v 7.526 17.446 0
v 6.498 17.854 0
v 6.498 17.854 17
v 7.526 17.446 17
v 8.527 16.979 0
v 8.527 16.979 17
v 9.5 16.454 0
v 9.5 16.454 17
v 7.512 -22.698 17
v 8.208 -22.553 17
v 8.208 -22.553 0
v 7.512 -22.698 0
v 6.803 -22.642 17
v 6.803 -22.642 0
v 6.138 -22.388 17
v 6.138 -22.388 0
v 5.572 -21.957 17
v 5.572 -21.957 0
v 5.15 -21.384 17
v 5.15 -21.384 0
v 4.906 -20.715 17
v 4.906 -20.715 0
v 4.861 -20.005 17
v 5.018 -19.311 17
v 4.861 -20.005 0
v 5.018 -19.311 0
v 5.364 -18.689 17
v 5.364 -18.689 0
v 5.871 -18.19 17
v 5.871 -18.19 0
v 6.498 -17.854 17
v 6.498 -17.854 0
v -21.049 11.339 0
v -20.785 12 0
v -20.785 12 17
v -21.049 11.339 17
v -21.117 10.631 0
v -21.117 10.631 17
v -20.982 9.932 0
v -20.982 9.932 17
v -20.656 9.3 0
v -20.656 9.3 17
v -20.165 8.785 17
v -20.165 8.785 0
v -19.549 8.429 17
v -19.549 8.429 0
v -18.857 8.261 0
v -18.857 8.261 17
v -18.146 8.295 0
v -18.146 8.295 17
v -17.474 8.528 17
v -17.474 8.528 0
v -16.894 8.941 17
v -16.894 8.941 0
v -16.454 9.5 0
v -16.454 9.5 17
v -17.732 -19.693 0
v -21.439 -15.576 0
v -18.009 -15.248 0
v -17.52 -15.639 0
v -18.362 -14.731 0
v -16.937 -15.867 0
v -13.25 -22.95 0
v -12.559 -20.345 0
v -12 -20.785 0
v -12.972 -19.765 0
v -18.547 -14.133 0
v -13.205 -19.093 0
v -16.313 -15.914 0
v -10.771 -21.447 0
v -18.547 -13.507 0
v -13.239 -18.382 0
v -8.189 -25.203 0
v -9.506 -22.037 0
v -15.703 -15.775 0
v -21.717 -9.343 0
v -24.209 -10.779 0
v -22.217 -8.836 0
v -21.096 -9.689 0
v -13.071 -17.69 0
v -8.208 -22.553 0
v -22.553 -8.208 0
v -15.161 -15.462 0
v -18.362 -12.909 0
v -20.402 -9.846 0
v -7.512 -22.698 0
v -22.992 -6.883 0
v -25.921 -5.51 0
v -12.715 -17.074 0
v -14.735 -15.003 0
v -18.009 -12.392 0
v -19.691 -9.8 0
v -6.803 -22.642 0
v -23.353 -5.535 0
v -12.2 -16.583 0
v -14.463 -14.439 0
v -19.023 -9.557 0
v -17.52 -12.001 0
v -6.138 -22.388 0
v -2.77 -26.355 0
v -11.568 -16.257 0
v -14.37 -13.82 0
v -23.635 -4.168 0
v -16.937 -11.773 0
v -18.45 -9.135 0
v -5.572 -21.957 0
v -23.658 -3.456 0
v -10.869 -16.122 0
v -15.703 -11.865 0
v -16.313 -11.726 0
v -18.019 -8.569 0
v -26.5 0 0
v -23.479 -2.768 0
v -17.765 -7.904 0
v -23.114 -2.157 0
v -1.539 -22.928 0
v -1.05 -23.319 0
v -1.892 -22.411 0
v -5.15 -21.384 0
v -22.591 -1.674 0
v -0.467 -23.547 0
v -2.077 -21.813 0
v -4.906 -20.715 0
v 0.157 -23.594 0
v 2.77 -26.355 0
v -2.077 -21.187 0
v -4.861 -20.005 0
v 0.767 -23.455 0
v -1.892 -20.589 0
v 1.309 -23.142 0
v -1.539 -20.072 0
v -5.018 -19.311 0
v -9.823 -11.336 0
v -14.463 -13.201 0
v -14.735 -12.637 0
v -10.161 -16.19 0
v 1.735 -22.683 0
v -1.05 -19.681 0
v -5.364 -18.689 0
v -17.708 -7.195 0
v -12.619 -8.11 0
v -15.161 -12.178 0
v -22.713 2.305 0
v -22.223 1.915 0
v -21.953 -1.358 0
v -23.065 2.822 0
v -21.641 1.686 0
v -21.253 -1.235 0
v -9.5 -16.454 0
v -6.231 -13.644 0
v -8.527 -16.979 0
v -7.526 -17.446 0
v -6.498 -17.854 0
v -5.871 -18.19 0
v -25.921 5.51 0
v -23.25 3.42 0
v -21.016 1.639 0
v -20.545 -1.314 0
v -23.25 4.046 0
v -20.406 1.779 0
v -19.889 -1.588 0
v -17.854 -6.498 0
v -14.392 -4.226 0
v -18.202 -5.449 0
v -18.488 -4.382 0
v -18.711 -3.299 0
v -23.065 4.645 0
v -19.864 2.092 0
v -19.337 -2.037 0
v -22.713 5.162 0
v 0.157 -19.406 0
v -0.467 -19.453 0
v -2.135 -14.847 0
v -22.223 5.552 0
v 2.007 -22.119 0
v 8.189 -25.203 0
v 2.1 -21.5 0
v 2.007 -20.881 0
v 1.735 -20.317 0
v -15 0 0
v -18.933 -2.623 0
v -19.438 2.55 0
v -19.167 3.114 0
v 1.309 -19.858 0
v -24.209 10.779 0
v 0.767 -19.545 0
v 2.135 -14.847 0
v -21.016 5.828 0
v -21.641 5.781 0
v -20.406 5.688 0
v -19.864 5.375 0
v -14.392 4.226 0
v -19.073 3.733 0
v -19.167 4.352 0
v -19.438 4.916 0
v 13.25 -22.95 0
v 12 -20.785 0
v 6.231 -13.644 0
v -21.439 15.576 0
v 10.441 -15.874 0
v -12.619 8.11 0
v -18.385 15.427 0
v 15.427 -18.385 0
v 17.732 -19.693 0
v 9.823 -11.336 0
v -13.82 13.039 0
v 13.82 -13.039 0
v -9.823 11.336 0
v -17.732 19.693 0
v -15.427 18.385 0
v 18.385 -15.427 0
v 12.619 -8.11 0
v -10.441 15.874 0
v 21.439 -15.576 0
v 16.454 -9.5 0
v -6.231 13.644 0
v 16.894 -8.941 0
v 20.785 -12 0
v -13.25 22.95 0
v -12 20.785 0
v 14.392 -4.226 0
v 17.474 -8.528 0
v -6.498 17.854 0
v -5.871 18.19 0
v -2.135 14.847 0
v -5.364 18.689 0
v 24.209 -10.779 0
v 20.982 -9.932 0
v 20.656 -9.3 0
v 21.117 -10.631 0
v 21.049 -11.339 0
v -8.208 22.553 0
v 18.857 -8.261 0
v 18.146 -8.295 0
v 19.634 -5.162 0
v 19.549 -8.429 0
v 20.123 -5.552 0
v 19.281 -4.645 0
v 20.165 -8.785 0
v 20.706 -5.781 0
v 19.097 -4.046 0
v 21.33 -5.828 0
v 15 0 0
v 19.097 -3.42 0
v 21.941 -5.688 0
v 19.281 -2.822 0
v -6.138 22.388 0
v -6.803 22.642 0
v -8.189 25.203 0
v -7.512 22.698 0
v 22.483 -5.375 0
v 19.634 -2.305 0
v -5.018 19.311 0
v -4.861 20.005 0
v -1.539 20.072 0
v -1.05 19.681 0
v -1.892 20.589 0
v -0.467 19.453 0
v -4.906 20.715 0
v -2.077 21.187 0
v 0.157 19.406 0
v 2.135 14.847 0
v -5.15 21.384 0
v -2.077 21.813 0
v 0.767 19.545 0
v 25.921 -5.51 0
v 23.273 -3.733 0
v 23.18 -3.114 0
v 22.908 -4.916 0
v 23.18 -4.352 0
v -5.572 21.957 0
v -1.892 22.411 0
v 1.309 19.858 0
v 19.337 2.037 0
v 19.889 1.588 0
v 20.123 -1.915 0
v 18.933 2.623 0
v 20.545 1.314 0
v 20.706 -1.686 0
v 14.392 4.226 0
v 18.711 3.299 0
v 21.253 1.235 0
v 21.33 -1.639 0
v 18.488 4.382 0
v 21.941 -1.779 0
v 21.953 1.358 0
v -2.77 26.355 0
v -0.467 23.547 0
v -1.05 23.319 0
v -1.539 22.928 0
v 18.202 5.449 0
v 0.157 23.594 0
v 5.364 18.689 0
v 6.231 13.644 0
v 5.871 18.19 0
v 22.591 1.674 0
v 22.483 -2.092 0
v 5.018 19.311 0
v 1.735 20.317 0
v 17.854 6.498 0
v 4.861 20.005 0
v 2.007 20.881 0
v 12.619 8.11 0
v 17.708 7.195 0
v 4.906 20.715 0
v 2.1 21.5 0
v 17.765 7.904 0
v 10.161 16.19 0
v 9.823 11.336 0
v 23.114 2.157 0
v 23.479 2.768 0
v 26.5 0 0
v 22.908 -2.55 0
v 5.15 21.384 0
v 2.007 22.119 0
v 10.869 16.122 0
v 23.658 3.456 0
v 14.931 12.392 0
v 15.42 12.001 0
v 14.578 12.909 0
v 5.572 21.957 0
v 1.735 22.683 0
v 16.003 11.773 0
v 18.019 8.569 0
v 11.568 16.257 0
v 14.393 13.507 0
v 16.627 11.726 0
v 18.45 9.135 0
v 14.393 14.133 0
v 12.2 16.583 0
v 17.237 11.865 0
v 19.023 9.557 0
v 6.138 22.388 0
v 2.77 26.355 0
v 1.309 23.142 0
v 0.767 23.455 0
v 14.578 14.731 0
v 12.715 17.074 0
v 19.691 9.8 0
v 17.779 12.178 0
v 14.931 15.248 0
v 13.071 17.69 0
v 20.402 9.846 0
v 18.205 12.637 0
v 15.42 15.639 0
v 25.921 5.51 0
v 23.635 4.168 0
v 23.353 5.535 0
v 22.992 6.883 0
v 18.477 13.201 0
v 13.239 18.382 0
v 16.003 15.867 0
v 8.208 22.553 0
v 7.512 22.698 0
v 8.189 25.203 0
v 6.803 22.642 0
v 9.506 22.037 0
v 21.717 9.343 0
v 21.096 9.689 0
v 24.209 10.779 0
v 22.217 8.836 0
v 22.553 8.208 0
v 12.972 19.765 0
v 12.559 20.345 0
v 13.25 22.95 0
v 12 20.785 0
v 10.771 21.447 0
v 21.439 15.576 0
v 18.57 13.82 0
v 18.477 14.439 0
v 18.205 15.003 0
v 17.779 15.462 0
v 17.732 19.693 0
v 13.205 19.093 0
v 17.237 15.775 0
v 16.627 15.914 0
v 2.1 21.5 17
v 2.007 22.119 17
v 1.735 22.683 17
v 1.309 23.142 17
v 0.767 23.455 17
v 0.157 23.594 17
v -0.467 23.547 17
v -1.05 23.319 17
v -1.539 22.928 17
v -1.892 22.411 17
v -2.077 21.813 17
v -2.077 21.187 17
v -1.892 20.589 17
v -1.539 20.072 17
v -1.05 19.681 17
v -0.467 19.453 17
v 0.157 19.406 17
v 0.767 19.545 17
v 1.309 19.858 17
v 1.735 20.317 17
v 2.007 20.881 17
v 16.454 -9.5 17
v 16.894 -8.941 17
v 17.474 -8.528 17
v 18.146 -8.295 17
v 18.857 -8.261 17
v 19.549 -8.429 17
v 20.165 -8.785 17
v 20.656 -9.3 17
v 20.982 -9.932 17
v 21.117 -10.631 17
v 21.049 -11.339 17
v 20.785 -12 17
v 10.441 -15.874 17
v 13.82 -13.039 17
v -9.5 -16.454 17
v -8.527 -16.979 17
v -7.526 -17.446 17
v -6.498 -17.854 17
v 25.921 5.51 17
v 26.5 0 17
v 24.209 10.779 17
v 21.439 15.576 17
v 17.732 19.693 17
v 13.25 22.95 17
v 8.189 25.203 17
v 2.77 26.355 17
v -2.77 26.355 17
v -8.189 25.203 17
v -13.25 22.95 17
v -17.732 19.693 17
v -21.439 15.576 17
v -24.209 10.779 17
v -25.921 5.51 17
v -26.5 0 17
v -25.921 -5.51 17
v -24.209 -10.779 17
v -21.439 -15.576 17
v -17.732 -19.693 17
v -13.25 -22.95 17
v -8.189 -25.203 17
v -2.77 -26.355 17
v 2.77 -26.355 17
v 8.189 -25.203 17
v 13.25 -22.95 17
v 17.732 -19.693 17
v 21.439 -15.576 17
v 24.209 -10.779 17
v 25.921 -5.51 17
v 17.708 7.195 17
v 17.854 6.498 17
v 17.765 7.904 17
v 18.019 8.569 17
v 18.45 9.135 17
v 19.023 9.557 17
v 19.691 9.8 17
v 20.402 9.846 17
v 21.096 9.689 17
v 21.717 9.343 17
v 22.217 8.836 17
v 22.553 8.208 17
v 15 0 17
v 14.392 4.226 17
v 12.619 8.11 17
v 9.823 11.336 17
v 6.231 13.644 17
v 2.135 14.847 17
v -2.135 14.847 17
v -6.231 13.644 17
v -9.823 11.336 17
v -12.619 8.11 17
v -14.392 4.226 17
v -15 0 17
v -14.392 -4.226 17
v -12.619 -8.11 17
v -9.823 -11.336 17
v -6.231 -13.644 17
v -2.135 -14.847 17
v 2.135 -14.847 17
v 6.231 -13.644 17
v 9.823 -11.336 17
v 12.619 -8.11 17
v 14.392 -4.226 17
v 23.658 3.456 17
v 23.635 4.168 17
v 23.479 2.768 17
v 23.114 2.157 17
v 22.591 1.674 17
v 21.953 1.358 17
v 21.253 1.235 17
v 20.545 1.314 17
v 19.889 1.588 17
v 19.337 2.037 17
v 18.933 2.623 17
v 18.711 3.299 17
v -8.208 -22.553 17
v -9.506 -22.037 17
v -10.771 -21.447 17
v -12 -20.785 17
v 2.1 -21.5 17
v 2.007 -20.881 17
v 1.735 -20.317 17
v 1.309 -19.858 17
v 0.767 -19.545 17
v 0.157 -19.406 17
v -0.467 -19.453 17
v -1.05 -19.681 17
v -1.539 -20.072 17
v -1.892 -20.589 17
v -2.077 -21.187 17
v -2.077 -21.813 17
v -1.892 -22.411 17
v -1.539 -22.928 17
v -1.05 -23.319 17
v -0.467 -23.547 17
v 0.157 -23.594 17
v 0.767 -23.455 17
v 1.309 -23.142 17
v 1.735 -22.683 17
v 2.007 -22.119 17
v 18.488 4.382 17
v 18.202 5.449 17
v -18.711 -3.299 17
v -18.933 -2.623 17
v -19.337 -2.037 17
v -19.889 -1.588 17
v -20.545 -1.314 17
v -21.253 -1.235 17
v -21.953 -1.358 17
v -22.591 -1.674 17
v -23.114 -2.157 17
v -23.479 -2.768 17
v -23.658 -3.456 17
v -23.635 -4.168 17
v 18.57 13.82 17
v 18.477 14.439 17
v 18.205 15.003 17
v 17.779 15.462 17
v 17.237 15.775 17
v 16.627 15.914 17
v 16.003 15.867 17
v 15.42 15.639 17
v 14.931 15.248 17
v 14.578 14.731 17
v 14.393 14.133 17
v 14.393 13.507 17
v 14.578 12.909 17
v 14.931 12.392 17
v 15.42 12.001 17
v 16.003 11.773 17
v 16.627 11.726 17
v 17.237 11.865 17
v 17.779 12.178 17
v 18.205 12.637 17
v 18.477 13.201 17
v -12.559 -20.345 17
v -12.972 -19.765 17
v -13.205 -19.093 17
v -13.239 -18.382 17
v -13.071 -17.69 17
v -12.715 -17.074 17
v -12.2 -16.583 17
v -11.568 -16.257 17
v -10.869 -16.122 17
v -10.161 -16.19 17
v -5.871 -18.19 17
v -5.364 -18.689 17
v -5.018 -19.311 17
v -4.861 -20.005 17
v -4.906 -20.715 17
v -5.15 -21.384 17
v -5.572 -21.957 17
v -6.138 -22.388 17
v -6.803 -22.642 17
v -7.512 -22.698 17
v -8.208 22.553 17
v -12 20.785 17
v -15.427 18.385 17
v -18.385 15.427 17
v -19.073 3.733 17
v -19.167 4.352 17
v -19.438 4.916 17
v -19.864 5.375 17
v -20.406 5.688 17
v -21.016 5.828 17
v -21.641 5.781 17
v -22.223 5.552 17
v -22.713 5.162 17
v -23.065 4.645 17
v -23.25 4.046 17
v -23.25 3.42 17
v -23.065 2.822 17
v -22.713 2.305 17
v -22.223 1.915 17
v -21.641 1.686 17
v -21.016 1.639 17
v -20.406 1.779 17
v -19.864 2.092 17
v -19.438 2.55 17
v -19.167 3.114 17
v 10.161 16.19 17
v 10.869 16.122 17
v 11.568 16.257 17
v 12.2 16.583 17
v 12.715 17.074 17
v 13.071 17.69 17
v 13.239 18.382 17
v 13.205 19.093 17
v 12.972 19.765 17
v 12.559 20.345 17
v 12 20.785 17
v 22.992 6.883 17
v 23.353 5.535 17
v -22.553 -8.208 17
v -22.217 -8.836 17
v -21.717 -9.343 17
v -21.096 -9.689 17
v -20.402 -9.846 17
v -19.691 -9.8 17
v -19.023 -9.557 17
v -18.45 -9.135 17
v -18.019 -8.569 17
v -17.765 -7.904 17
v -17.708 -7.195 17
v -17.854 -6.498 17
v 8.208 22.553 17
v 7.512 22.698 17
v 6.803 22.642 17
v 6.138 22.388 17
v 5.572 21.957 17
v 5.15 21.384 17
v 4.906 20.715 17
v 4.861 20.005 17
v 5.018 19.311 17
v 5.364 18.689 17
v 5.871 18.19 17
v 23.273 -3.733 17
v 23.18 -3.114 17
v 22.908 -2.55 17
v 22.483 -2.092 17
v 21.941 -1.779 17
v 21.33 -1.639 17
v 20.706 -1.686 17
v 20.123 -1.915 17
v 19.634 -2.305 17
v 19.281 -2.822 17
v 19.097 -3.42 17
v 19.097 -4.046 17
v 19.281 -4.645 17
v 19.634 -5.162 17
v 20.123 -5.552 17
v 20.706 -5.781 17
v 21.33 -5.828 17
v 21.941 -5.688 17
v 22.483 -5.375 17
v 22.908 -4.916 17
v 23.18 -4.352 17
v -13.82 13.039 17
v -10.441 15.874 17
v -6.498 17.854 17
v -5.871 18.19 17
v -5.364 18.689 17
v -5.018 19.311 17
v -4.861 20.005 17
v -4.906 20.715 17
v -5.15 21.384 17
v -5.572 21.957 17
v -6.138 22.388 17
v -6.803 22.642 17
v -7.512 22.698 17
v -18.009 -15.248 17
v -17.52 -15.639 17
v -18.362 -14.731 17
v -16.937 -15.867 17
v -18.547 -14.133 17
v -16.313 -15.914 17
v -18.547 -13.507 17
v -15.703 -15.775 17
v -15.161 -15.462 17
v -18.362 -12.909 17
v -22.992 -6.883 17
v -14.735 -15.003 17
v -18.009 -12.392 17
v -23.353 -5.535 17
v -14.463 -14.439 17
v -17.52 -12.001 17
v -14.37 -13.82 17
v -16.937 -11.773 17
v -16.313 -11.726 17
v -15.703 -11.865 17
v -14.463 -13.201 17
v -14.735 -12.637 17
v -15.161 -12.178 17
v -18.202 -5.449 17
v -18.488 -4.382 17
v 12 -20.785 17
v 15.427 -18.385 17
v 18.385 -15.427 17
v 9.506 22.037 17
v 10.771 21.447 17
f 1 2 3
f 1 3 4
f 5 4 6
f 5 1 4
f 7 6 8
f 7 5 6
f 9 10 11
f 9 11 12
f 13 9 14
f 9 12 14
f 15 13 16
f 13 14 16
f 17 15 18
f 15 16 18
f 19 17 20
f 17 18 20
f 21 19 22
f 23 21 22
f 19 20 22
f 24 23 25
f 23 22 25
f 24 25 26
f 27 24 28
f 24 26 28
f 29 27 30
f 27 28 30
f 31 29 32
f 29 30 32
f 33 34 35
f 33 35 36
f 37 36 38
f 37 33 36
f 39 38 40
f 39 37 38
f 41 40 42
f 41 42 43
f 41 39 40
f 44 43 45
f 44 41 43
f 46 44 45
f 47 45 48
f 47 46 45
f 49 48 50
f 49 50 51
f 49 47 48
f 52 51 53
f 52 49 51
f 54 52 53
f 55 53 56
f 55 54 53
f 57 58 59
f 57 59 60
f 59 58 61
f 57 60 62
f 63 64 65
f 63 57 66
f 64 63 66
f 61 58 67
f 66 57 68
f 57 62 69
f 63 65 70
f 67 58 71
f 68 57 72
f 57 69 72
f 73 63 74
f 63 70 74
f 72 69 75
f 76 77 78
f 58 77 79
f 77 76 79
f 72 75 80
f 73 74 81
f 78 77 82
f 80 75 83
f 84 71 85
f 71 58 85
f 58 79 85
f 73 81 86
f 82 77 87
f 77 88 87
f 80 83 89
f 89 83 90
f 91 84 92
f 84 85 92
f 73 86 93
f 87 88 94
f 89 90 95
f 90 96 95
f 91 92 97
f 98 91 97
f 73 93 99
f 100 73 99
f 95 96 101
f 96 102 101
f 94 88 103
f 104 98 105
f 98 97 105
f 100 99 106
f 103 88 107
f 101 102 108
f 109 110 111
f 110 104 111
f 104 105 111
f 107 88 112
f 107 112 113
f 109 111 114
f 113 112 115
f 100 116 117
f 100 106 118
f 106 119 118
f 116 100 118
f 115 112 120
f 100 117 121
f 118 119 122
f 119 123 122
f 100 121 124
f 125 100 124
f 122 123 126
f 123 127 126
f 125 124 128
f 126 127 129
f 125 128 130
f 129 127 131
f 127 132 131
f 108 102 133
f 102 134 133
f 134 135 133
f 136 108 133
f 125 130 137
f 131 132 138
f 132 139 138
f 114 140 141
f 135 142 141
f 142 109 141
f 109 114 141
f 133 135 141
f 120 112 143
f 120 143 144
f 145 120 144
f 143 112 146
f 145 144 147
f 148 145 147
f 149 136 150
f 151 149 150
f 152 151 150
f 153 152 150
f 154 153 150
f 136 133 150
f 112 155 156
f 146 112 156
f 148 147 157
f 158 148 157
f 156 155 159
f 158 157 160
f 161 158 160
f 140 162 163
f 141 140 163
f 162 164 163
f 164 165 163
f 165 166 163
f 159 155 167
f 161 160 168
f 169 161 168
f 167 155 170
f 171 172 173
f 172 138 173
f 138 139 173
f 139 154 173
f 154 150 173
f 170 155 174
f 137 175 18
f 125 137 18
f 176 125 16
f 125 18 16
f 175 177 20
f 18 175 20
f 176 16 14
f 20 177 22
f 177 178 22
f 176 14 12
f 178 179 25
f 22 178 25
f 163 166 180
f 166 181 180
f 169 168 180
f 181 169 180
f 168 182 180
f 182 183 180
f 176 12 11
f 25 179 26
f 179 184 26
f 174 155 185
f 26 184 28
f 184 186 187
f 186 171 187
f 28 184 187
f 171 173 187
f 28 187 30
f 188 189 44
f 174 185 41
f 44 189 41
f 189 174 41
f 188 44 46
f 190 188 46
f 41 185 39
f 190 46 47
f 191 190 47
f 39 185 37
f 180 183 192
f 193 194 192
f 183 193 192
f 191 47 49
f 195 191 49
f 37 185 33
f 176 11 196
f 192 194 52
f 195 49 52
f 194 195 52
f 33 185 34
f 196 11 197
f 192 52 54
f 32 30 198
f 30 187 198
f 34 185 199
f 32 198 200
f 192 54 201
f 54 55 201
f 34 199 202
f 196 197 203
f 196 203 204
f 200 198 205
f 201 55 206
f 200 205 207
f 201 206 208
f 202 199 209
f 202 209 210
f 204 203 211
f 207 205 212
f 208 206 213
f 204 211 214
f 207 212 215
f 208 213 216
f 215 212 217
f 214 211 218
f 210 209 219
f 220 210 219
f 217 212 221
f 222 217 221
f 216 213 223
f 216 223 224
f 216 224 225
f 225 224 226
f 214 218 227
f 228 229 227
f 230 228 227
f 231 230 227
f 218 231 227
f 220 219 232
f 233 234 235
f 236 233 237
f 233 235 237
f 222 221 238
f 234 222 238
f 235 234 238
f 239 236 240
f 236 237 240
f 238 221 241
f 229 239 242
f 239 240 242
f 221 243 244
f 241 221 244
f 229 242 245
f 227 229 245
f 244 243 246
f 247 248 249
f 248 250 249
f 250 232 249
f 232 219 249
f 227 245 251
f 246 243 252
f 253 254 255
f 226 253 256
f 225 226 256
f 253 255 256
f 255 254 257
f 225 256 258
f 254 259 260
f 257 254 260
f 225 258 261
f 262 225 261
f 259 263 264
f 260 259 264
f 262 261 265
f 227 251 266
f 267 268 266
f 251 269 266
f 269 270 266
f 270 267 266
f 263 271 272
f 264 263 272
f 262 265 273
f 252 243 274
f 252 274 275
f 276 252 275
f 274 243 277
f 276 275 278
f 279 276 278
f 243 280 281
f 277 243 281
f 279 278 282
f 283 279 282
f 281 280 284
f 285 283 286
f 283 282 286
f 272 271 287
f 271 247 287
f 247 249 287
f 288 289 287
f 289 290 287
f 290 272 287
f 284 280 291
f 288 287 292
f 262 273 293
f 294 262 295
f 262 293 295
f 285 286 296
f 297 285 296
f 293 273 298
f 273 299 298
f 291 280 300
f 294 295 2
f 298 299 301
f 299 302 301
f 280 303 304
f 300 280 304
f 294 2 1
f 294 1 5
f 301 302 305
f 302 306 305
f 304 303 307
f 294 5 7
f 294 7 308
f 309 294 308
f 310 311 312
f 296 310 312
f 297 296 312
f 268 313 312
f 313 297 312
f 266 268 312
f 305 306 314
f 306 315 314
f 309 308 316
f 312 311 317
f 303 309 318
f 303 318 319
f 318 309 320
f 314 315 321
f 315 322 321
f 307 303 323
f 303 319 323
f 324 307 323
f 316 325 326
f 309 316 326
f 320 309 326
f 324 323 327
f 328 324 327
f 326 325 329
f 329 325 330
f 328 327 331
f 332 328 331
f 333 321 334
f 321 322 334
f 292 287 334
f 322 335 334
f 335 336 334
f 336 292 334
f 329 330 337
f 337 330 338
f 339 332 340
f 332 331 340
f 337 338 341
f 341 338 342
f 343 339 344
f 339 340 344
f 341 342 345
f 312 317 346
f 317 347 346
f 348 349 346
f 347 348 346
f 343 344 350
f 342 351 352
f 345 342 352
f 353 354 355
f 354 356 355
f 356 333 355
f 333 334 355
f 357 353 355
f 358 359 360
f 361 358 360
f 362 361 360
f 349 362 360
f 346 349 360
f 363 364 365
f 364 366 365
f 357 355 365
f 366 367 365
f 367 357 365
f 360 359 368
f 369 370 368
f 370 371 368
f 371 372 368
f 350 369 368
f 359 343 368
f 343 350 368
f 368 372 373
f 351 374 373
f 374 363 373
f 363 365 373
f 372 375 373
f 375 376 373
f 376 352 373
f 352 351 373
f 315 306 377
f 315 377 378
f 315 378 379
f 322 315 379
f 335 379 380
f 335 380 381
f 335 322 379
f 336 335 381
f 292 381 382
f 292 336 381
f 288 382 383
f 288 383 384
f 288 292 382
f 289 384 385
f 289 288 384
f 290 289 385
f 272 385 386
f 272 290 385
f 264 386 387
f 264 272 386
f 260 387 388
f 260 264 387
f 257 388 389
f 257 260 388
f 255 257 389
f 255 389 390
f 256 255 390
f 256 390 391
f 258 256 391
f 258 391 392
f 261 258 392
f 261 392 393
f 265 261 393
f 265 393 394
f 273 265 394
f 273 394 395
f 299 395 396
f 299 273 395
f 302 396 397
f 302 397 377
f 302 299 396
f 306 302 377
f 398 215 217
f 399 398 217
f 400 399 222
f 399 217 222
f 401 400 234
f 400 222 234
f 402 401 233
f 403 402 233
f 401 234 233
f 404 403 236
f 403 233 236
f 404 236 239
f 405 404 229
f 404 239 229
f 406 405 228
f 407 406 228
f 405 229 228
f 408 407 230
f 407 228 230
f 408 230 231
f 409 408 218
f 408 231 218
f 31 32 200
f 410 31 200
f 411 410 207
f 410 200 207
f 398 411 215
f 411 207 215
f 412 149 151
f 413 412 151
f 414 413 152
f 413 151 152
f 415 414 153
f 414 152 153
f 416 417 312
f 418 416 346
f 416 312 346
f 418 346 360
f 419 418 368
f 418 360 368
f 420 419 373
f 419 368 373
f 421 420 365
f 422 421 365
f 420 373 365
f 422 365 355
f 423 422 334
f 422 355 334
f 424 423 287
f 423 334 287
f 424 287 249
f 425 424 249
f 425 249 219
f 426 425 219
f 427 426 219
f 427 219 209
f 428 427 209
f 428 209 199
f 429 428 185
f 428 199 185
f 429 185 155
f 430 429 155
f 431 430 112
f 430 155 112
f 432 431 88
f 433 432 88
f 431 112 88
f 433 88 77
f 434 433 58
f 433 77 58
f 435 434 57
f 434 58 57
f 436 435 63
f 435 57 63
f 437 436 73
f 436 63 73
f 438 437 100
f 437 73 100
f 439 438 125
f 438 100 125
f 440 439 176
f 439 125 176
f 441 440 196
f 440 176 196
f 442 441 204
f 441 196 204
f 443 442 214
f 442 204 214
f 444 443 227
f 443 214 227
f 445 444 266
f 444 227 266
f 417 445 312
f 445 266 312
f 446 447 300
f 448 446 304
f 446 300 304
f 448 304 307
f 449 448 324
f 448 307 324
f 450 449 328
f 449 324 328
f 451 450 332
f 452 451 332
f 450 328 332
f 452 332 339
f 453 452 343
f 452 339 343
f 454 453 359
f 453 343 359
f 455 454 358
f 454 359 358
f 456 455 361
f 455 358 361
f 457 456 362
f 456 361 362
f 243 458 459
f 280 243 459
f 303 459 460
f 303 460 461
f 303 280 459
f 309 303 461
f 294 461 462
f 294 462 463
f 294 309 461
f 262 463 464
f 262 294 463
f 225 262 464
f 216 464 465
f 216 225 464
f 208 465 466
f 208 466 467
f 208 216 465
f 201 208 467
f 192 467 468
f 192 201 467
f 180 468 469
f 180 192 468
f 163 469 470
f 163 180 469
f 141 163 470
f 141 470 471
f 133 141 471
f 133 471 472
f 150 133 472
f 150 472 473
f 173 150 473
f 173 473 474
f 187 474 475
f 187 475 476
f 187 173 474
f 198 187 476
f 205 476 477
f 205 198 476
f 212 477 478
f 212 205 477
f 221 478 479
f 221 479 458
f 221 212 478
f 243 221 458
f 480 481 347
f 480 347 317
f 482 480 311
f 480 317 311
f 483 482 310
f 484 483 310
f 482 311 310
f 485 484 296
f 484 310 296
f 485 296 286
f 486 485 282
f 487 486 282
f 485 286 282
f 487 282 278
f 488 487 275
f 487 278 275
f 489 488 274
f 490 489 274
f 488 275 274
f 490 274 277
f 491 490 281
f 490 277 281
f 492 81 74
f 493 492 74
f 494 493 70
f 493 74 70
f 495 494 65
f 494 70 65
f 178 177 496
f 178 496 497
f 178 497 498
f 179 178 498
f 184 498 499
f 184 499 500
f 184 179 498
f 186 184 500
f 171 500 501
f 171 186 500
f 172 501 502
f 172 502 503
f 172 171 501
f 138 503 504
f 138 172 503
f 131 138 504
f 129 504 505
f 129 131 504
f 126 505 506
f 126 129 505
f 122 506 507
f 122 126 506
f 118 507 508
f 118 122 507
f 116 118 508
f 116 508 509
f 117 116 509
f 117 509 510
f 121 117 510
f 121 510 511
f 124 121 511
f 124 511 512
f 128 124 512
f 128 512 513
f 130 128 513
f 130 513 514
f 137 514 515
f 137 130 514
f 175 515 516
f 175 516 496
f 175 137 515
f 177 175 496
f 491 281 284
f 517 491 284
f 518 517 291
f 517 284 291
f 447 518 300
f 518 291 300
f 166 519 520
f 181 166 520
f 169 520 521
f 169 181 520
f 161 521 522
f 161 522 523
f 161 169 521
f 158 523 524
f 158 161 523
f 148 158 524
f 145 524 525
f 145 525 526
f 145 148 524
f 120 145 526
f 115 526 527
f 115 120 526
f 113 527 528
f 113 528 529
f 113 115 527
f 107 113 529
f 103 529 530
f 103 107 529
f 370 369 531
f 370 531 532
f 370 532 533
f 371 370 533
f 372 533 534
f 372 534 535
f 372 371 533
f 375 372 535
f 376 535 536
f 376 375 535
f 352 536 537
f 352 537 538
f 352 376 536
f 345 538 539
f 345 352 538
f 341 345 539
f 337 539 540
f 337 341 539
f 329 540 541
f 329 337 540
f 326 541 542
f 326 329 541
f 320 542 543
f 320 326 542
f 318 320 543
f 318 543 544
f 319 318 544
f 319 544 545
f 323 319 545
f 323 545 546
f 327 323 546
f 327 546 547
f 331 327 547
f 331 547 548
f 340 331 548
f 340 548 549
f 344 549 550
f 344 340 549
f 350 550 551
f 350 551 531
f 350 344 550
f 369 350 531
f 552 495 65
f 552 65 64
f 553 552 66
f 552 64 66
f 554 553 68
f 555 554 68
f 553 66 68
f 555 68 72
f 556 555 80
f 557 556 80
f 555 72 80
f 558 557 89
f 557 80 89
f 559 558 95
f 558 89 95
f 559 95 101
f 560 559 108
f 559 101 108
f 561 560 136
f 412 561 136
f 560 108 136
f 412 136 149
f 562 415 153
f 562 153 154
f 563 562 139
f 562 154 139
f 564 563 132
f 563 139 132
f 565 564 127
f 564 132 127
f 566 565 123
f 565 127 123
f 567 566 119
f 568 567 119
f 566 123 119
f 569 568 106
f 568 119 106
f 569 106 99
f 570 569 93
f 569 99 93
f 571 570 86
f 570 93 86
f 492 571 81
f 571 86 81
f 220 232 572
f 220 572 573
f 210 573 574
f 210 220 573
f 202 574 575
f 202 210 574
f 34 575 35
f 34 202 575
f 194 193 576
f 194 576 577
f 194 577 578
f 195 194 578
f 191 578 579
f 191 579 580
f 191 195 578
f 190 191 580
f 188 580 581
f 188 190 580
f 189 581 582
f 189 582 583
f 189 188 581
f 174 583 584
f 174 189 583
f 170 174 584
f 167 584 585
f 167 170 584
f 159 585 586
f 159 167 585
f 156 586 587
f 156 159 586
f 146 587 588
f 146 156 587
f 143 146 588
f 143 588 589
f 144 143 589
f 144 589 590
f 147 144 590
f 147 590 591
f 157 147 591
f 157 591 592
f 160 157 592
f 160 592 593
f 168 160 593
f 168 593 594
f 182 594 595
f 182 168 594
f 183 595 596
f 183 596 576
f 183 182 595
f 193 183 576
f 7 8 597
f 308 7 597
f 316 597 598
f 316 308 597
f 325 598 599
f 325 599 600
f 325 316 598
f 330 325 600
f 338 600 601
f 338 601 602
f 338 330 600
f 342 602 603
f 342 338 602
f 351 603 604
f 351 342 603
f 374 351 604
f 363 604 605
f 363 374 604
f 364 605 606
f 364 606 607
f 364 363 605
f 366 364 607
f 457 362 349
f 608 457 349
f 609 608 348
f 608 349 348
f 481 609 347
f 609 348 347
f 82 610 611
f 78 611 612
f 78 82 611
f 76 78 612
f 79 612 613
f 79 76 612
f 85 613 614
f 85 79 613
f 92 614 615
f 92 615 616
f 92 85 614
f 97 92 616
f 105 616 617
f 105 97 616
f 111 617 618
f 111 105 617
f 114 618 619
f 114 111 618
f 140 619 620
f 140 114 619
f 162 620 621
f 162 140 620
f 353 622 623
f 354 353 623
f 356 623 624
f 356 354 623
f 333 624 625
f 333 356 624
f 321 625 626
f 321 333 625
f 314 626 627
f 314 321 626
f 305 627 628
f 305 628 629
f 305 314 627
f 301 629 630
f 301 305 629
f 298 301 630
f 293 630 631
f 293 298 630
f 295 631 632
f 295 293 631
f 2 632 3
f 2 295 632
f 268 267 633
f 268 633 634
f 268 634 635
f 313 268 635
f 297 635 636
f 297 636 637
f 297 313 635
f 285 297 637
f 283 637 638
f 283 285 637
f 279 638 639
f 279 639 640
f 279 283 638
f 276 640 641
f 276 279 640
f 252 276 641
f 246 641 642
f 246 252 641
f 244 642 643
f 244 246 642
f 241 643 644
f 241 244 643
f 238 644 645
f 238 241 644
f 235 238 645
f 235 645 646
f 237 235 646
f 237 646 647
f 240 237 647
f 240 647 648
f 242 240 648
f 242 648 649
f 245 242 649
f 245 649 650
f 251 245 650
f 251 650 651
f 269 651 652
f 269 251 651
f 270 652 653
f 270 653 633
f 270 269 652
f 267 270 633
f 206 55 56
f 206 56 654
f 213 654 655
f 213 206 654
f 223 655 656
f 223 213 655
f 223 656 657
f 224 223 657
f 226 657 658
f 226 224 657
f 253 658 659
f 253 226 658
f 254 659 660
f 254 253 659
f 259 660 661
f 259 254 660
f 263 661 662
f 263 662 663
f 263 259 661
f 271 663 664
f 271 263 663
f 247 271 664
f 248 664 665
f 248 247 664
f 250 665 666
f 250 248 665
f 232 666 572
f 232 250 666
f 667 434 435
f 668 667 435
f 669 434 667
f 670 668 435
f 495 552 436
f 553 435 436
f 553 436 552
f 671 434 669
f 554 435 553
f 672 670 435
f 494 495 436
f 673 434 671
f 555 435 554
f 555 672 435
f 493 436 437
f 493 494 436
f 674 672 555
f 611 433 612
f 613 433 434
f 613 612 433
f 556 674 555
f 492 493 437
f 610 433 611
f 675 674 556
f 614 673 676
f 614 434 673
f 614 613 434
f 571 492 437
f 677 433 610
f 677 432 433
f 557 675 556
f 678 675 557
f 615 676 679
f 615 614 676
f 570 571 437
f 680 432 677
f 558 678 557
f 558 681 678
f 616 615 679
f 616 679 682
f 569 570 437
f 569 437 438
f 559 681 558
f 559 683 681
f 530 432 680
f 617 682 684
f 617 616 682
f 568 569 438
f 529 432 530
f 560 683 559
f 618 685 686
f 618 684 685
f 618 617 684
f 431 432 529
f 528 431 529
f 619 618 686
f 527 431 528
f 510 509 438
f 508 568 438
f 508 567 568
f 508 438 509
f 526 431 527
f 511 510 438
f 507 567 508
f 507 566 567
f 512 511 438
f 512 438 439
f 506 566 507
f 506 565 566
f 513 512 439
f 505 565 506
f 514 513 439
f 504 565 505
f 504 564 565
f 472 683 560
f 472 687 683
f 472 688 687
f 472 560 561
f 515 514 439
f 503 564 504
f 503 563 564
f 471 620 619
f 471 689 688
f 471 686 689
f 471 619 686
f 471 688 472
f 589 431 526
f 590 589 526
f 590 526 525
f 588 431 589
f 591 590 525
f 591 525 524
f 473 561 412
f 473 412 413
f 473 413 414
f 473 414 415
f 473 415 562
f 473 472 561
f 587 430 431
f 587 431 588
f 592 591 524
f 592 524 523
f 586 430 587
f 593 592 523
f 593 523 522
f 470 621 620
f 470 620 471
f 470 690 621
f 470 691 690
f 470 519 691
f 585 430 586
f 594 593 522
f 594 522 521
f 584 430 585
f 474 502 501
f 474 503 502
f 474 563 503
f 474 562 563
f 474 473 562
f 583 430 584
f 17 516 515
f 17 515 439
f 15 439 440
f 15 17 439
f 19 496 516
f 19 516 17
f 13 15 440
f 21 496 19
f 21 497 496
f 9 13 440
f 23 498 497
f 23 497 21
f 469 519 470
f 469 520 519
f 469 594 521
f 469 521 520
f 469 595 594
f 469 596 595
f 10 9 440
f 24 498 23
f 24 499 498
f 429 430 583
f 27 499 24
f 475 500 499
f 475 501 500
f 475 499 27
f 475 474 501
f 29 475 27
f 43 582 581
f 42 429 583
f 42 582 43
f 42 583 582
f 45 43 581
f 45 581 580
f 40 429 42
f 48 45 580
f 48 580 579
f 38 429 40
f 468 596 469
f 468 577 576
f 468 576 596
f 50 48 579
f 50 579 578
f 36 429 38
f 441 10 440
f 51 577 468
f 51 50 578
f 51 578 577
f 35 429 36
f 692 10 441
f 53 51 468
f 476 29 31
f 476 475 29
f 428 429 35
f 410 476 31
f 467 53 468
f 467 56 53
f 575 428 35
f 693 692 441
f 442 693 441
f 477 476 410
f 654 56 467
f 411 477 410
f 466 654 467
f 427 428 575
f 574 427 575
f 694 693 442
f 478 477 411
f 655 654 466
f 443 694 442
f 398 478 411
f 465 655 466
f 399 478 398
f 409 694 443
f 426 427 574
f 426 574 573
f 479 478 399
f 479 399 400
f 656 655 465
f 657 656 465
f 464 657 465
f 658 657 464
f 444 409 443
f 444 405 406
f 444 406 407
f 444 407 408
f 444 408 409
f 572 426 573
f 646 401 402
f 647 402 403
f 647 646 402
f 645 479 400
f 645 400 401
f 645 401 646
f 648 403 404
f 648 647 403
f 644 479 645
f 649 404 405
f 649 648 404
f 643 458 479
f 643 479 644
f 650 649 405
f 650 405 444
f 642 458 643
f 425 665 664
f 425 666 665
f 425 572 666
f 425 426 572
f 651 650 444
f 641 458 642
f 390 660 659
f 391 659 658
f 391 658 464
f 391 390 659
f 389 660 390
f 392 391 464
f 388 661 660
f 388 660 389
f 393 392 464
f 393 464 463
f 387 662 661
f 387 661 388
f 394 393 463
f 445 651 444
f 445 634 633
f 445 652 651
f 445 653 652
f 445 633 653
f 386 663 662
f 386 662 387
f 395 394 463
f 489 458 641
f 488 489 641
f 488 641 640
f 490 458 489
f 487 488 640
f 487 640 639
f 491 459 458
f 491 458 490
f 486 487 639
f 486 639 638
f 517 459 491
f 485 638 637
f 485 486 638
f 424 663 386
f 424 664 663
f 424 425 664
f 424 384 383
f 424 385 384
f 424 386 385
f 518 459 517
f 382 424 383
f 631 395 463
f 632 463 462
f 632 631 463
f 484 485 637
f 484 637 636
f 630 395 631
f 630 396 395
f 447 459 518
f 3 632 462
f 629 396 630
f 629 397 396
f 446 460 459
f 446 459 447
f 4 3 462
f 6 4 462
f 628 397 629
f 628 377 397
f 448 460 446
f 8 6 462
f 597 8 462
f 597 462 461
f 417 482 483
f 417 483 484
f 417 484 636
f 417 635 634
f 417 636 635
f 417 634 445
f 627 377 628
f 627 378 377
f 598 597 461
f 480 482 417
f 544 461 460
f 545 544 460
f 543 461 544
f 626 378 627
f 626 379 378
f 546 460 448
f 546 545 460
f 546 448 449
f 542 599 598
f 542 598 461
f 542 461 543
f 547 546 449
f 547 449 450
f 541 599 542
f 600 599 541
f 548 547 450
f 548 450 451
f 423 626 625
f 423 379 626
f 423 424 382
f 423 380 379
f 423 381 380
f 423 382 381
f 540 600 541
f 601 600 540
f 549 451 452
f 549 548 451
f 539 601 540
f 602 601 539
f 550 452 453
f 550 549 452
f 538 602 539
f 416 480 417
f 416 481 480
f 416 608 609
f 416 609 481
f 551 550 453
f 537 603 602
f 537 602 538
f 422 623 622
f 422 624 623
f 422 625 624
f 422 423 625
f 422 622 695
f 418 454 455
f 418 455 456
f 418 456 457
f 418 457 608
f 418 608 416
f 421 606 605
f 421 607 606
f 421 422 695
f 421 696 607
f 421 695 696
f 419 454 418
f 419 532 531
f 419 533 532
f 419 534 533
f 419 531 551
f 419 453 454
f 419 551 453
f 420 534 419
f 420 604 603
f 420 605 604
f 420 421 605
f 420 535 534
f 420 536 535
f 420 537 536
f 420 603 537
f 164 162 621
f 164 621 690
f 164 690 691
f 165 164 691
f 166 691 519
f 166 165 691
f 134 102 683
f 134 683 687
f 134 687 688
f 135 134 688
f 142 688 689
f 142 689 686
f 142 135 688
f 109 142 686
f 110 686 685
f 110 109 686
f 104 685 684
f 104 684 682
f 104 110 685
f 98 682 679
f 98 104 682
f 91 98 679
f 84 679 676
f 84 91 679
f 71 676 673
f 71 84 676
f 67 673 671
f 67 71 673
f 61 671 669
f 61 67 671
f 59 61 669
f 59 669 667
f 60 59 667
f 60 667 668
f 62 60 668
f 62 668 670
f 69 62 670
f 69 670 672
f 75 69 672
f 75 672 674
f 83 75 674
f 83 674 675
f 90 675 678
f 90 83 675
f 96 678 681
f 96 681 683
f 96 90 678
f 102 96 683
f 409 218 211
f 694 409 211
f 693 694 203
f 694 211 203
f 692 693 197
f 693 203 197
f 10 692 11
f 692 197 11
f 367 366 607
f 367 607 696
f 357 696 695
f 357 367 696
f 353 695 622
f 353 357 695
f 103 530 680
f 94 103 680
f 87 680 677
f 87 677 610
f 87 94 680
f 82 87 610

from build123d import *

# Parameters (mm, degrees)
SKETCH_1_R      = 26.5
SKETCH_1_R_2    = 15
SKETCH_1_R_3    = 2.1
EXTRUDE_1_DEPTH = 17


with BuildPart() as part:
    # 草图1 → 凸台-拉伸1 (new body)
    with BuildSketch(Plane.XY):
        Circle(SKETCH_1_R)
        Circle(SKETCH_1_R_2, mode=Mode.SUBTRACT)
        with Locations((0, 21.5)):
            Circle(SKETCH_1_R_3, mode=Mode.SUBTRACT)
        with Locations((16.469955527, 13.819933608)):
            Circle(SKETCH_1_R_3, mode=Mode.SUBTRACT)
        with Locations((21.17336669, -3.73343582)):
            Circle(SKETCH_1_R_3, mode=Mode.SUBTRACT)
        with Locations((0, -21.5)):
            Circle(SKETCH_1_R_3, mode=Mode.SUBTRACT)
        with Locations((-16.469955527, -13.819933608)):
            Circle(SKETCH_1_R_3, mode=Mode.SUBTRACT)
        with Locations((-21.17336669, 3.73343582)):
            Circle(SKETCH_1_R_3, mode=Mode.SUBTRACT)
        with BuildLine():
            ThreePointArc((-8.20848344, 22.552622899), (-15.426902632, 18.385066635), (-20.784609691, 12))
            ThreePointArc((-20.784609691, 12), (-19.869546181, 8.584936491), (-16.454482672, 9.5))
            ThreePointArc((-16.454482672, 9.5), (-12.212964584, 14.554844419), (-6.498382723, 17.854159795))
            ThreePointArc((-6.498382723, 17.854159795), (-5.00420153, 21.058441705), (-8.20848344, 22.552622899))
        make_face(mode=Mode.SUBTRACT)
        with BuildLine():
            ThreePointArc((12, 20.784609691), (10.142838282, 21.751386889), (8.20848344, 22.552622899))
            ThreePointArc((8.20848344, 22.552622899), (5.00420153, 21.058441705), (6.498382723, 17.854159795))
            ThreePointArc((6.498382723, 17.854159795), (8.029746973, 17.219847954), (9.5, 16.454482672))
            ThreePointArc((9.5, 16.454482672), (12.915063509, 17.369546181), (12, 20.784609691))
        make_face(mode=Mode.SUBTRACT)
        with BuildLine():
            ThreePointArc((18.711347307, 3.299315376), (18.352590699, 4.917561857), (17.854159795, 6.498382723))
            ThreePointArc((17.854159795, 6.498382723), (19.348340989, 9.702664633), (22.552622899, 8.20848344))
            ThreePointArc((22.552622899, 8.20848344), (23.182219831, 6.211657082), (23.635386072, 4.167556264))
            ThreePointArc((23.635386072, 4.167556264), (21.607487134, 1.271416437), (18.711347307, 3.299315376))
        make_face(mode=Mode.SUBTRACT)
        with BuildLine():
            ThreePointArc((6.498382723, -17.854159795), (12.212964584, -14.554844419), (16.454482672, -9.5))
            ThreePointArc((16.454482672, -9.5), (19.869546181, -8.584936491), (20.784609691, -12))
            ThreePointArc((20.784609691, -12), (15.426902632, -18.385066635), (8.20848344, -22.552622899))
            ThreePointArc((8.20848344, -22.552622899), (5.00420153, -21.058441705), (6.498382723, -17.854159795))
        make_face(mode=Mode.SUBTRACT)
        with BuildLine():
            ThreePointArc((-9.5, -16.454482672), (-8.029746973, -17.219847954), (-6.498382723, -17.854159795))
            ThreePointArc((-6.498382723, -17.854159795), (-5.00420153, -21.058441705), (-8.20848344, -22.552622899))
            ThreePointArc((-8.20848344, -22.552622899), (-10.142838282, -21.751386889), (-12, -20.784609691))
            ThreePointArc((-12, -20.784609691), (-12.915063509, -17.369546181), (-9.5, -16.454482672))
        make_face(mode=Mode.SUBTRACT)
        with BuildLine():
            ThreePointArc((-23.635386072, -4.167556264), (-23.182219831, -6.211657082), (-22.552622899, -8.20848344))
            ThreePointArc((-22.552622899, -8.20848344), (-19.348340989, -9.702664633), (-17.854159795, -6.498382723))
            ThreePointArc((-17.854159795, -6.498382723), (-18.352590699, -4.917561857), (-18.711347307, -3.299315376))
            ThreePointArc((-18.711347307, -3.299315376), (-21.607487134, -1.271416437), (-23.635386072, -4.167556264))
        make_face(mode=Mode.SUBTRACT)
    extrude(amount=EXTRUDE_1_DEPTH)


solid = part.part
